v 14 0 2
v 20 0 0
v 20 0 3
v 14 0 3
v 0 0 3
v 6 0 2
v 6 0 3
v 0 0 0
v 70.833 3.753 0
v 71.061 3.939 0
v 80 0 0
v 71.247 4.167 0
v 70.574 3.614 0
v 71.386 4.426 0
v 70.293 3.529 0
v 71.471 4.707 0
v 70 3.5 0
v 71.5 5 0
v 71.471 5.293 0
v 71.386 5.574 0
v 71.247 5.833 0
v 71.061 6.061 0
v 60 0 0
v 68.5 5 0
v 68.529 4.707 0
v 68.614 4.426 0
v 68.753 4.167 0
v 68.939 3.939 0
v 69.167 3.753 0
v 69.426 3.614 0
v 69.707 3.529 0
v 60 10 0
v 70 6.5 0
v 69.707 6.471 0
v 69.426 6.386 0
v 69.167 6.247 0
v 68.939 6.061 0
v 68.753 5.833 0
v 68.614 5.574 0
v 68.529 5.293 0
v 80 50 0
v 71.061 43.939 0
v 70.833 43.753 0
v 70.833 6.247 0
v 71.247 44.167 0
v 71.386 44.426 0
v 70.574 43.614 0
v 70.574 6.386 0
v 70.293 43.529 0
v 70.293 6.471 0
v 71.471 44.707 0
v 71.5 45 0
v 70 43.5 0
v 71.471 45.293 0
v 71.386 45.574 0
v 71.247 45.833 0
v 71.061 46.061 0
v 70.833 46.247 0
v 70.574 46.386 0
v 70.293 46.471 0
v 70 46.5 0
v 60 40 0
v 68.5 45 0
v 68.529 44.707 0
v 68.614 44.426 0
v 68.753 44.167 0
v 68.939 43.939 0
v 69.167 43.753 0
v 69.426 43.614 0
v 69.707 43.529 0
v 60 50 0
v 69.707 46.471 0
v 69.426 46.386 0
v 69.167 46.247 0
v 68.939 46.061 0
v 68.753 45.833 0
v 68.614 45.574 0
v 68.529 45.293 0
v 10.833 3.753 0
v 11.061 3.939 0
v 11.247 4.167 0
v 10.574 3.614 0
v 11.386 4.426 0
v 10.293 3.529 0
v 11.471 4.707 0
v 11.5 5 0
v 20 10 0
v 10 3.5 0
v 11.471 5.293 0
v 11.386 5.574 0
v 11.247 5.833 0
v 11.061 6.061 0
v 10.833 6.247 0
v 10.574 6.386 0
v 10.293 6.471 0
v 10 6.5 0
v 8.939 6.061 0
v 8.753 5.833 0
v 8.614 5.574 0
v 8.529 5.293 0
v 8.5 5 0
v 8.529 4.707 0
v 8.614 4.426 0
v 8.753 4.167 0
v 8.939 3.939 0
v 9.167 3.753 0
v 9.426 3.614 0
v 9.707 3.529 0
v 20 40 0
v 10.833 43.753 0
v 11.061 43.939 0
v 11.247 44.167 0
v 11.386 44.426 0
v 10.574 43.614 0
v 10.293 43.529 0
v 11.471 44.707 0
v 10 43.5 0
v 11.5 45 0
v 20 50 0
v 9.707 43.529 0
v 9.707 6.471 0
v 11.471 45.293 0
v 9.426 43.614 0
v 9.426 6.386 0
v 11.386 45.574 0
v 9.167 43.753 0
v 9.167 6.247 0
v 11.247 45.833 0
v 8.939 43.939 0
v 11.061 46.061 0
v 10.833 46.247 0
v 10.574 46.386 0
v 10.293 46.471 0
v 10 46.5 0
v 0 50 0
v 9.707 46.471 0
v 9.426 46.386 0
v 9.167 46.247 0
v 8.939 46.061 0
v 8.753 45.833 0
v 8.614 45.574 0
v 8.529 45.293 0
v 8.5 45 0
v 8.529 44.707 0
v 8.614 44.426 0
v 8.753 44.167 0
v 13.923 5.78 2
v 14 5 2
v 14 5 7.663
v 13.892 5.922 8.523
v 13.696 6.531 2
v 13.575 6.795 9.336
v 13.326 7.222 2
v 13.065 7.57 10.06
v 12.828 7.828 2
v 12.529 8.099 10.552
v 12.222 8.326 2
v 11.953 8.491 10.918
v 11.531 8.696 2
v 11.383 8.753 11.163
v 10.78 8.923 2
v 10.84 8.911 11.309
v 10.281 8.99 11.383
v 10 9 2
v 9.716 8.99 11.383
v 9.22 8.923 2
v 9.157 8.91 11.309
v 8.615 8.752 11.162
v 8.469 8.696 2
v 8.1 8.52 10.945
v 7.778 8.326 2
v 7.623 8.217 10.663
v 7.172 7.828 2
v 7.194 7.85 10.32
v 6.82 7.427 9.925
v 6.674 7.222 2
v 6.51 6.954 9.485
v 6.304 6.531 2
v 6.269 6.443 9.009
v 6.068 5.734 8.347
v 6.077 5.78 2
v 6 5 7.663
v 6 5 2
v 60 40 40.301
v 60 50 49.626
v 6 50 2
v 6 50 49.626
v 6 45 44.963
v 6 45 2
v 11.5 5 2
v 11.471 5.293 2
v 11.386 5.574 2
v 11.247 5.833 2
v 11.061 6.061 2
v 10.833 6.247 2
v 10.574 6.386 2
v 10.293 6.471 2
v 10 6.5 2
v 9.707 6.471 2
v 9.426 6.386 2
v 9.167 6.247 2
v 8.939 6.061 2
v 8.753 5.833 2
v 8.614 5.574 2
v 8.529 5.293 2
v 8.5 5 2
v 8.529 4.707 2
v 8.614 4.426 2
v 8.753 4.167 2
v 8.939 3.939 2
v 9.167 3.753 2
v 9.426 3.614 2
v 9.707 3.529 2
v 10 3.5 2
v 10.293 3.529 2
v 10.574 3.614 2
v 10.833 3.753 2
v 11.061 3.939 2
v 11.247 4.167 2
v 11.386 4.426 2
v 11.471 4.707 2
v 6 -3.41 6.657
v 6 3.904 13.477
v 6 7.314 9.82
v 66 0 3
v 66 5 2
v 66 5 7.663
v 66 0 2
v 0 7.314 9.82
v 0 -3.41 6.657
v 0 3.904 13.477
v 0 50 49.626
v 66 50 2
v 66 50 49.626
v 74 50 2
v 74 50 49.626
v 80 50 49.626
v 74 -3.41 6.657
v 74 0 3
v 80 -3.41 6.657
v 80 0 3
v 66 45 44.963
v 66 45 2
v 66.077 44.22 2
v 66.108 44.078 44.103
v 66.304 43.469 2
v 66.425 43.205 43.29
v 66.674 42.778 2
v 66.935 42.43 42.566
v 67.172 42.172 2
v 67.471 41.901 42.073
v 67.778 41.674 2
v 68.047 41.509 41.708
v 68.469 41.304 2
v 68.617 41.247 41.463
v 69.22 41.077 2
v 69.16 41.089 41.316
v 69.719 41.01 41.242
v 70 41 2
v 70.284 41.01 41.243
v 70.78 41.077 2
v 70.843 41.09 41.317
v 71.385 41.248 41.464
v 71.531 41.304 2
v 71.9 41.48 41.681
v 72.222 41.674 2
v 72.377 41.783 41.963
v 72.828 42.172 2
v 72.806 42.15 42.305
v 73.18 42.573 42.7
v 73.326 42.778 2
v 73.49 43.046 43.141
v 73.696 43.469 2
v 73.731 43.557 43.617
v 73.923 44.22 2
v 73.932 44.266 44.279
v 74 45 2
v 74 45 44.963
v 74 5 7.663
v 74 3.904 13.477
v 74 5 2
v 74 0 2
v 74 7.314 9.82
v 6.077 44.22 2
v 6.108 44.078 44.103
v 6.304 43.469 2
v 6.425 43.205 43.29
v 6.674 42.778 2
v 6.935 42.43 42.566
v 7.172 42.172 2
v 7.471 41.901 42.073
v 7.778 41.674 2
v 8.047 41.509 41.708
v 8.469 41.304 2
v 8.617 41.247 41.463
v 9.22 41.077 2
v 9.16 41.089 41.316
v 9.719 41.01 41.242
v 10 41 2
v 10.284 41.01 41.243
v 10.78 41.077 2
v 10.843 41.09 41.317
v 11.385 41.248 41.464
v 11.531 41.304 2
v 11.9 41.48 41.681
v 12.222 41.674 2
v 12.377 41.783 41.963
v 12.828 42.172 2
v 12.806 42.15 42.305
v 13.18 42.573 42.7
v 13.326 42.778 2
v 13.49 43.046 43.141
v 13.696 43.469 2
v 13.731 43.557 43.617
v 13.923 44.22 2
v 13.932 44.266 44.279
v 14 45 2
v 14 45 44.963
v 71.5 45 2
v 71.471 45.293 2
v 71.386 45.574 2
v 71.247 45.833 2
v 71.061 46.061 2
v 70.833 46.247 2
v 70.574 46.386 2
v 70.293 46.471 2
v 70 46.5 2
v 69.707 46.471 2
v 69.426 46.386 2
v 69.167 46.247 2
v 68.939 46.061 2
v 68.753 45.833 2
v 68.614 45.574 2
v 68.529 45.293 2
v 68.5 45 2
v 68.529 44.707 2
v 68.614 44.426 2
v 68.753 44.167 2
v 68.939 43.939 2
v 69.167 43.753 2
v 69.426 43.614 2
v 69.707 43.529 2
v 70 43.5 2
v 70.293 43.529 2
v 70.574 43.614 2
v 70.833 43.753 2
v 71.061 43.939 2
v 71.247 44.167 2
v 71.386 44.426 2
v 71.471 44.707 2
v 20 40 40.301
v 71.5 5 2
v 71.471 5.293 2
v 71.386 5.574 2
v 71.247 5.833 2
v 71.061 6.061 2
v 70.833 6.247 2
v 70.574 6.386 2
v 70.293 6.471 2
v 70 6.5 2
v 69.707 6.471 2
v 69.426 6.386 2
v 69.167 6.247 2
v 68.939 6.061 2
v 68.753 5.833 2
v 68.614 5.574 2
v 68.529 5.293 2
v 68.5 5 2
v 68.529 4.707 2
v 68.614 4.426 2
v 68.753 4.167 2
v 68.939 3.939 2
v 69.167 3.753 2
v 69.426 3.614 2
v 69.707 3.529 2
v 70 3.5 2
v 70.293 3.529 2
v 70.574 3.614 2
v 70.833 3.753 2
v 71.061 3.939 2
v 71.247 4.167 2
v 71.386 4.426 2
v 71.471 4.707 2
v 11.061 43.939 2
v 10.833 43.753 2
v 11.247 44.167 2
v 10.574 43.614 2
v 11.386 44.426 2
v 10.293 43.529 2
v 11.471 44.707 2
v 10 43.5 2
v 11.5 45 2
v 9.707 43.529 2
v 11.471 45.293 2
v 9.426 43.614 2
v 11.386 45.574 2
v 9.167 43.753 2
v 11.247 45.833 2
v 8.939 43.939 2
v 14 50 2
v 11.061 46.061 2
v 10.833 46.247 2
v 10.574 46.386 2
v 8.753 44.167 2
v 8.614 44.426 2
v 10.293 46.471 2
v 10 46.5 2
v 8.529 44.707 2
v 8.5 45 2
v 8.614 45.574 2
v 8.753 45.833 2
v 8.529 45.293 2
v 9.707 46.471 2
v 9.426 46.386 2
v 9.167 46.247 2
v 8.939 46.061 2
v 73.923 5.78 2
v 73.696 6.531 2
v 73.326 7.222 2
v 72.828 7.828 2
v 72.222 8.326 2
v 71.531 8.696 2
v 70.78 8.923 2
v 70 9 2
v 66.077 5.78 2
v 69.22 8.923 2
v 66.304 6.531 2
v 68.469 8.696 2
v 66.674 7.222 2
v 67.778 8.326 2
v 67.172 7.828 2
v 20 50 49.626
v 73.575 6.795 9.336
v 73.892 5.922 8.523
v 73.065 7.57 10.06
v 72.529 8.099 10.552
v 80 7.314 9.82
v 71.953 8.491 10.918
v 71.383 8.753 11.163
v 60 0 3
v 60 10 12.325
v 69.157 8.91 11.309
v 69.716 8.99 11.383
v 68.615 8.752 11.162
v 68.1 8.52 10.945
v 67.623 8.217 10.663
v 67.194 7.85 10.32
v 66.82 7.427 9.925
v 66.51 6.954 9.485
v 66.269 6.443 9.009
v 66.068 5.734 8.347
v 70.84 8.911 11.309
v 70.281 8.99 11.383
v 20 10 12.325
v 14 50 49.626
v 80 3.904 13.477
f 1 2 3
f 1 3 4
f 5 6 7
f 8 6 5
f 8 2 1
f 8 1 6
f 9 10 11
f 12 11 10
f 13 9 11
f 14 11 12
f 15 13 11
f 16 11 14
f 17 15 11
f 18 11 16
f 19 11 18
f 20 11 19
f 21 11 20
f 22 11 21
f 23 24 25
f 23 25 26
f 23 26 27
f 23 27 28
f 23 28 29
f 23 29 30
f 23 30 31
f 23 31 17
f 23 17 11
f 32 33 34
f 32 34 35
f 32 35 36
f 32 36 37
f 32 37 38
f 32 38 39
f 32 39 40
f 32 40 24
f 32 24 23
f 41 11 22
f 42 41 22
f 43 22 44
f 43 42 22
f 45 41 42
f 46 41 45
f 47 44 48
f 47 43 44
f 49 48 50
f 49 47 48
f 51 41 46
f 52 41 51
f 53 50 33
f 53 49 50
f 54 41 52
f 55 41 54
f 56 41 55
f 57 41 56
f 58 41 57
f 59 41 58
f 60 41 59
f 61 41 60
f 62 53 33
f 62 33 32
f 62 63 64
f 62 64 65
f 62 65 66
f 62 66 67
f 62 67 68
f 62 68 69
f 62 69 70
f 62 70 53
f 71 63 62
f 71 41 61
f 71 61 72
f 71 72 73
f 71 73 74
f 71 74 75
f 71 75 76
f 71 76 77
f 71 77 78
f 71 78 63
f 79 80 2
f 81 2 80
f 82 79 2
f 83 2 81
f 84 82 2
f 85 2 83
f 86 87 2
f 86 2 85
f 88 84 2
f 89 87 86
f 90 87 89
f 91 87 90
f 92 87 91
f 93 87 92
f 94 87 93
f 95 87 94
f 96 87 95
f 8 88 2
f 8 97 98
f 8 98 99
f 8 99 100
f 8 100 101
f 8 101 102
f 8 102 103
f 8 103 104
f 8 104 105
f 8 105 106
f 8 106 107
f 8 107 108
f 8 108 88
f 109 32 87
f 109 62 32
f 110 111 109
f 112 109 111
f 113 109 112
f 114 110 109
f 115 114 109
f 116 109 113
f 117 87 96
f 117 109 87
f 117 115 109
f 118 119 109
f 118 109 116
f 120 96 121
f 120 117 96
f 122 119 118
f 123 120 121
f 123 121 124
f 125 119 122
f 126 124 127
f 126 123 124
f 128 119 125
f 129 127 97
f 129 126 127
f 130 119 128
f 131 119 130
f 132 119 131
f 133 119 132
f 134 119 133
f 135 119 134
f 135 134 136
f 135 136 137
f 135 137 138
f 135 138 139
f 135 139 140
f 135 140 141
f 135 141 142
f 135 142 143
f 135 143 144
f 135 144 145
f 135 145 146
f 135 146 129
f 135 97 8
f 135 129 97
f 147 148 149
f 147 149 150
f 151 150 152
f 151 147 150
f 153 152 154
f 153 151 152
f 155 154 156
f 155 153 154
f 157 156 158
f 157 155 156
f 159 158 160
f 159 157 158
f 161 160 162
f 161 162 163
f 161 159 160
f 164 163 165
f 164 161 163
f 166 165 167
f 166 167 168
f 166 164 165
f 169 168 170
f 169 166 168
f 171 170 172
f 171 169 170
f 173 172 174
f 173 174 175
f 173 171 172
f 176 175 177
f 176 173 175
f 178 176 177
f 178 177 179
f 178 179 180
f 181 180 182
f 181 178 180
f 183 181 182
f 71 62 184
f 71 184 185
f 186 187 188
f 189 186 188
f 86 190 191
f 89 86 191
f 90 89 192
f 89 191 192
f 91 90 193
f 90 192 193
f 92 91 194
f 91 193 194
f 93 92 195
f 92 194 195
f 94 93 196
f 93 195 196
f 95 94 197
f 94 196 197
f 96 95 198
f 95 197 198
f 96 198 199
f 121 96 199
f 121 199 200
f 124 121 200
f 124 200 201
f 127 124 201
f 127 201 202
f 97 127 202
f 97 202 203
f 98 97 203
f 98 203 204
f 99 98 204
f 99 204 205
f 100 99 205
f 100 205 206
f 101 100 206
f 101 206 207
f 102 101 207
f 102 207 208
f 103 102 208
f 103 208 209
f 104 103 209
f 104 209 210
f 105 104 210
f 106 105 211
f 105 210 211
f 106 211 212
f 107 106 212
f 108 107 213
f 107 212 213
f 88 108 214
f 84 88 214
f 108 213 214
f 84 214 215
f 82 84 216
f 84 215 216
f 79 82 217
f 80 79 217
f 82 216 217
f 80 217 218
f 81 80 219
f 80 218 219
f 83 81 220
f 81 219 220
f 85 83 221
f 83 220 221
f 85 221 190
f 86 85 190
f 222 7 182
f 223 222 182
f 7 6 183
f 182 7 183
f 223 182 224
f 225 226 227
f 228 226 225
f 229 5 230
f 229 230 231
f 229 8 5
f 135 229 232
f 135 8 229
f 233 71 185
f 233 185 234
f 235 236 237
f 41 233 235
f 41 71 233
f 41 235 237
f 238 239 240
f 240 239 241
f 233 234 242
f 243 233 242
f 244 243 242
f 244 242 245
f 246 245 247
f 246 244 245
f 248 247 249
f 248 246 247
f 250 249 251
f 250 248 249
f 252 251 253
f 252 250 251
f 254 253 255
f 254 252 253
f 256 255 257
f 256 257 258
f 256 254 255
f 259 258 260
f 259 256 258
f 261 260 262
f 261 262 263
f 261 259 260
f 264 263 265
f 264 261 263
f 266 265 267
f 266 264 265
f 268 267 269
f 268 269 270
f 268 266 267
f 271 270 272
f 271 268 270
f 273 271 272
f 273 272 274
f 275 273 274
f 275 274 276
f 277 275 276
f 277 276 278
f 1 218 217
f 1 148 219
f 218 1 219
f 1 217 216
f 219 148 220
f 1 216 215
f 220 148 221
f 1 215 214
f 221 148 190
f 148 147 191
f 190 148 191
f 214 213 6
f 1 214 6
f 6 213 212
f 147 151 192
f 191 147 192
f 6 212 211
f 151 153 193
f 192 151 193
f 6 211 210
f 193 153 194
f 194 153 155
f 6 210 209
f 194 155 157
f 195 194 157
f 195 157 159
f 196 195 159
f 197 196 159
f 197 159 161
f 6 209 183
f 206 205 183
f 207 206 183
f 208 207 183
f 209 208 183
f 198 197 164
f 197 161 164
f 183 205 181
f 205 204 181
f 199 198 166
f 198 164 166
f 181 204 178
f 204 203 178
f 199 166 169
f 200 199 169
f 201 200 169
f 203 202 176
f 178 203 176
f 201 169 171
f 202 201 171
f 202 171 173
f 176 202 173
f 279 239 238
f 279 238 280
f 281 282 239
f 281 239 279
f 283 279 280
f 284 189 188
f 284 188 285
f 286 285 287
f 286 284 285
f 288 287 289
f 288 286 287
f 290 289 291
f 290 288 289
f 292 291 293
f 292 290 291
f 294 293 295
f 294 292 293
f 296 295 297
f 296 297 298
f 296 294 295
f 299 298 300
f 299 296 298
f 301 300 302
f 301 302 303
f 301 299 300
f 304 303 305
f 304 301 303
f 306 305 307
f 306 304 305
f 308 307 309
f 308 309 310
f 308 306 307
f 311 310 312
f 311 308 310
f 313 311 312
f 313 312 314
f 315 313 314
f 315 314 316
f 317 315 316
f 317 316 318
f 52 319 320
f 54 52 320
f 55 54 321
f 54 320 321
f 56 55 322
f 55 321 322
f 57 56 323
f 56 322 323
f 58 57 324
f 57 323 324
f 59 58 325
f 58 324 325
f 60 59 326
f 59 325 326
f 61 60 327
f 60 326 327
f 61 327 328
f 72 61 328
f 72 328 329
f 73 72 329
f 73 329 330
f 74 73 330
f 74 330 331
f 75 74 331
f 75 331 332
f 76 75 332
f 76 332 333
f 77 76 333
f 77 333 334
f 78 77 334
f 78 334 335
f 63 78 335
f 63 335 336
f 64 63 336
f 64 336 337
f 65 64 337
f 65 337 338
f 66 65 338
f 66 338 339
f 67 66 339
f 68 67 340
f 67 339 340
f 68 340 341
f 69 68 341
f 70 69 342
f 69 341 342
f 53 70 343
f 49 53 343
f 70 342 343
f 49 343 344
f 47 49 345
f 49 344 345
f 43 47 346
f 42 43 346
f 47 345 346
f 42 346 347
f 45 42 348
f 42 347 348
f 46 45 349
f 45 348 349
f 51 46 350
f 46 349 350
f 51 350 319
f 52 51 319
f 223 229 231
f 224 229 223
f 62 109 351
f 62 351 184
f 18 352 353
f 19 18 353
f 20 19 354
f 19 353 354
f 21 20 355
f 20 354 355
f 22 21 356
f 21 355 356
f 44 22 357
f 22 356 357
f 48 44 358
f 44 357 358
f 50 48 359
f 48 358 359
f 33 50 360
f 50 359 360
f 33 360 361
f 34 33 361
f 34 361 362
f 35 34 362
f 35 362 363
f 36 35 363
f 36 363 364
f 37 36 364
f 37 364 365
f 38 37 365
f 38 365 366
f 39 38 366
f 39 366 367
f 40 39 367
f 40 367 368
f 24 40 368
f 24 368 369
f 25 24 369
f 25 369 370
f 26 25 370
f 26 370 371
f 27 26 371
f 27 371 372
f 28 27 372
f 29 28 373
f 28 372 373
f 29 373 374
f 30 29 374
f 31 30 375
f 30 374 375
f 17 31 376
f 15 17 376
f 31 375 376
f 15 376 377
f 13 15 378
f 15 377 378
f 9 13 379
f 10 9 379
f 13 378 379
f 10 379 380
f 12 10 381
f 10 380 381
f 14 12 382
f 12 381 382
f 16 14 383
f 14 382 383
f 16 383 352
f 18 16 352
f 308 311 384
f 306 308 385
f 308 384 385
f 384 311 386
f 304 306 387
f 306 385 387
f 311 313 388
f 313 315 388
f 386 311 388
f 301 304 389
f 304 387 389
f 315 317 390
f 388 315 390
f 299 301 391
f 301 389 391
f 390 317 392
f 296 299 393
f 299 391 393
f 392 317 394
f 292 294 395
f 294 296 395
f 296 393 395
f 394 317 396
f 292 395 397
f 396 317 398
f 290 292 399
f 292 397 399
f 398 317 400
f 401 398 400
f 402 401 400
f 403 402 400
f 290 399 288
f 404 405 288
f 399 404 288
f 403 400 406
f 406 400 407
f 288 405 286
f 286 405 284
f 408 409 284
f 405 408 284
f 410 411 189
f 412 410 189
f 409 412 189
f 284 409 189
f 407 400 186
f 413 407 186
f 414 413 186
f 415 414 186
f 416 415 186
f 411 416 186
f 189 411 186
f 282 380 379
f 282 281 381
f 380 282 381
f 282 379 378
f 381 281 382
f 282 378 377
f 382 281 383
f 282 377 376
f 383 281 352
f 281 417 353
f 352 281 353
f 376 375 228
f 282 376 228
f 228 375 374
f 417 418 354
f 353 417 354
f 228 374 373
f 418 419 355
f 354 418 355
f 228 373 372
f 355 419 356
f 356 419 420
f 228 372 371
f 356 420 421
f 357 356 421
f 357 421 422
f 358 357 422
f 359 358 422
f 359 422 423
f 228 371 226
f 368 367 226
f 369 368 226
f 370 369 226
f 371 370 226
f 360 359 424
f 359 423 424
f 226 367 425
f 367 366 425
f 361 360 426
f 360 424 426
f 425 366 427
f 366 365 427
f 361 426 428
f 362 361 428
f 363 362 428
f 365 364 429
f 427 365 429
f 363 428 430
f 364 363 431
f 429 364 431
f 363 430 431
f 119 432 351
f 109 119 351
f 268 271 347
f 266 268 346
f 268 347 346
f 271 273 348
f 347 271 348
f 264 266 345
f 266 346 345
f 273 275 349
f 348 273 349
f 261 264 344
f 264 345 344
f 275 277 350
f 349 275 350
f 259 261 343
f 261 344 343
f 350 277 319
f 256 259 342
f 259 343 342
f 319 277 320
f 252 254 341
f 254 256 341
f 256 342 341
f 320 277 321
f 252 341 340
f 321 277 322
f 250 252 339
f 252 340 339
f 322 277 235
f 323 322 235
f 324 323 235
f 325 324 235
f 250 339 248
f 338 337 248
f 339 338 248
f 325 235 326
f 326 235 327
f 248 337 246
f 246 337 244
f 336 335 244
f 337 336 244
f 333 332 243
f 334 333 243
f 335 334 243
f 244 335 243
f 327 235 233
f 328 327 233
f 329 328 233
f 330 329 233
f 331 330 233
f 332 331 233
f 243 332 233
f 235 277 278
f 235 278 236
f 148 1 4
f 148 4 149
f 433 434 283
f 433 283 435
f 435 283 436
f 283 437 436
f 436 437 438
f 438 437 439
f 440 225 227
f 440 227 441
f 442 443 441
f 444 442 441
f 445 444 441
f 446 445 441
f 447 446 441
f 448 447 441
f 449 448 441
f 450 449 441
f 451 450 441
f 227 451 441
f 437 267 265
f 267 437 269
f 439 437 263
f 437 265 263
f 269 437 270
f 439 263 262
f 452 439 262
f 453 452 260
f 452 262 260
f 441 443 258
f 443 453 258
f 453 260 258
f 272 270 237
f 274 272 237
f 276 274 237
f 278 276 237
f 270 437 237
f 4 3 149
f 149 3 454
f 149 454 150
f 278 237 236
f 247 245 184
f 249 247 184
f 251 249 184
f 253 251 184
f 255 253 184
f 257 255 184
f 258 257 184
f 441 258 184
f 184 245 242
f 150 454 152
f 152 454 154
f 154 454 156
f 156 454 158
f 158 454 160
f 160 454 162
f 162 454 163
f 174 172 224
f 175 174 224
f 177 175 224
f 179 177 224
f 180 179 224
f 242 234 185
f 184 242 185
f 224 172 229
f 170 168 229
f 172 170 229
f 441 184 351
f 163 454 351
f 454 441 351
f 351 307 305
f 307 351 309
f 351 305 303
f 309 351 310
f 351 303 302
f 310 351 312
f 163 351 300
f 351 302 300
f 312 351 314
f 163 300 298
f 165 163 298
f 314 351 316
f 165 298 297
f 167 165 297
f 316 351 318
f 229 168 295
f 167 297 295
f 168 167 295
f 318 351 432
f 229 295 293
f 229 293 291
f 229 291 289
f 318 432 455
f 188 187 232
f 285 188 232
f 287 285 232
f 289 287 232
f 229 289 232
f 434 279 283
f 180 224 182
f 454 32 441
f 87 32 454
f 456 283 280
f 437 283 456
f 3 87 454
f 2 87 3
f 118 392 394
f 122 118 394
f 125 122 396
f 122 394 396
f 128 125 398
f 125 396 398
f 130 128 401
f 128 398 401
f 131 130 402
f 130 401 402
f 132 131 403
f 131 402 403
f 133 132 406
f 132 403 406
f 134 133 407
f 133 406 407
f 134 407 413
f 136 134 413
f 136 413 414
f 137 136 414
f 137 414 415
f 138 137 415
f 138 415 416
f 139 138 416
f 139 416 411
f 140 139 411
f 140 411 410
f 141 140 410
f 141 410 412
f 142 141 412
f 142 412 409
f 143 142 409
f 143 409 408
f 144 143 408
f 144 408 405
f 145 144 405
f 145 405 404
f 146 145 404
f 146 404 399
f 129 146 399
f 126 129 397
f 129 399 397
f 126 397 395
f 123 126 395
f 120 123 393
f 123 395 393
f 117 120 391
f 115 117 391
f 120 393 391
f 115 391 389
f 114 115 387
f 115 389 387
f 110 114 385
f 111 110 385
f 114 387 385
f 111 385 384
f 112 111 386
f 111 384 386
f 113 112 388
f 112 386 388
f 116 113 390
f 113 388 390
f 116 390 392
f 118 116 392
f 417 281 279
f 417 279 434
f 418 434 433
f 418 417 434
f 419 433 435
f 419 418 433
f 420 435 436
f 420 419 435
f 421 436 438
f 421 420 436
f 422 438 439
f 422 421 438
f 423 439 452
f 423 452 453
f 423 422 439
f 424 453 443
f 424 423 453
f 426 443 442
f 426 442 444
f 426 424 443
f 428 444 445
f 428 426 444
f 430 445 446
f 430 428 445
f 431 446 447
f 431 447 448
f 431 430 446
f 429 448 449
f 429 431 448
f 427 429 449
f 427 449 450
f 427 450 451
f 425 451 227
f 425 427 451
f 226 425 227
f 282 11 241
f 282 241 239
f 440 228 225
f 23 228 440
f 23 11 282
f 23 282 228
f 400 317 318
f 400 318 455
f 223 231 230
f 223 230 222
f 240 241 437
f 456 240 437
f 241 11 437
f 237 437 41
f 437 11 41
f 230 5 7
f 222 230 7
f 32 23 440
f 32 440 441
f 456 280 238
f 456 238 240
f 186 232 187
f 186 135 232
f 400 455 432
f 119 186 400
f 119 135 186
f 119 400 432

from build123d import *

# Parameters (mm, degrees)
EXTRUDE_2_DEPTH     = 2
SKETCH_3_R          = 1.5
CUT_EXTRUDE_1_DEPTH = 95.361008897
EXTRUDE_3_DEPTH     = 1
DRAFT_4_ANGLE       = 43
SKETCH_6_W          = 6
SKETCH_6_H          = 10
EXTRUDE_4_DEPTH     = 5
SKETCH_7_W          = 6
SKETCH_7_H          = 10
EXTRUDE_5_DEPTH     = 5


with BuildPart() as part:
    # 草图1 → 凸台-拉伸2 (new body)
    with BuildSketch(Plane.XY):
        Polygon((0, 0), (0, 50), (20, 50), (20, 40), (60, 40), (60, 50), (80, 50), (80, 0), (60, 0), (60, 10), (20, 10), (20, 0), align=None)
    extrude(amount=EXTRUDE_2_DEPTH)

    # 草图3 → 切除-拉伸1 (cut, through all)
    with BuildSketch(Plane.XY.offset(2)):
        with Locations((10, 45)):
            Circle(SKETCH_3_R)
        with Locations((10, 5)):
            Circle(SKETCH_3_R)
        with Locations((70, 45)):
            Circle(SKETCH_3_R)
        with Locations((70, 5)):
            Circle(SKETCH_3_R)
    extrude(amount=-CUT_EXTRUDE_1_DEPTH, mode=Mode.SUBTRACT)

    # 草图5 → 凸台-拉伸3 (add)
    with BuildSketch(Plane.XY.offset(2)):
        with BuildLine():
            Line((0, 50), (6, 50))
            Line((6, 50), (6, 45))
            ThreePointArc((6, 45), (10, 41), (14, 45))
            Line((14, 45), (14, 50))
            Line((14, 50), (20, 50))
            Line((20, 50), (20, 40))
            Line((20, 40), (60, 40))
            Line((60, 40), (60, 50))
            Line((60, 50), (66, 50))
            Line((66, 50), (66, 45))
            ThreePointArc((66, 45), (70, 41), (74, 45))
            Line((74, 45), (74, 50))
            Line((74, 50), (80, 50))
            Line((80, 50), (80, 0))
            Line((80, 0), (74, 0))
            Line((74, 0), (74, 5))
            ThreePointArc((74, 5), (70, 9), (66, 5))
            Line((66, 5), (66, 0))
            Line((66, 0), (60, 0))
            Line((60, 0), (60, 10))
            Line((60, 10), (20, 10))
            Line((20, 10), (20, 0))
            Line((20, 0), (14, 0))
            Line((14, 0), (14, 5))
            ThreePointArc((14, 5), (10, 9), (6, 5))
            Line((6, 5), (6, 0))
            Line((6, 0), (0, 0))
            Line((0, 0), (0, 50))
        make_face()
    extrude(amount=EXTRUDE_3_DEPTH)

    # 拔模4
    draft_4_faces = [part.faces().sort_by_distance(p)[0] for p in [
        (40, 25, 3),
    ]]
    draft(draft_4_faces, Plane(origin=(20, 0, 2), x_dir=(-1, 0, 0), z_dir=(0, -1, 0)), DRAFT_4_ANGLE)

    # 草图6 → 凸台-拉伸4 (add)
    with BuildSketch(Plane(origin=(0, -1.496346075, 1.604634711), x_dir=(1, 0, 0), z_dir=(0, -0.6819983600624997, 0.7313537016191695))):
        with Locations((3, 7.04599508)):
            Rectangle(SKETCH_6_W, SKETCH_6_H)
    extrude(amount=EXTRUDE_4_DEPTH)

    # 草图7 → 凸台-拉伸5 (add)
    with BuildSketch(Plane(origin=(0, -1.496346075, 1.604634711), x_dir=(1, 0, 0), z_dir=(0, -0.6819983600624997, 0.7313537016191695))):
        with Locations((77, 7.04599508)):
            Rectangle(SKETCH_7_W, SKETCH_7_H)
    extrude(amount=EXTRUDE_5_DEPTH)


solid = part.part
